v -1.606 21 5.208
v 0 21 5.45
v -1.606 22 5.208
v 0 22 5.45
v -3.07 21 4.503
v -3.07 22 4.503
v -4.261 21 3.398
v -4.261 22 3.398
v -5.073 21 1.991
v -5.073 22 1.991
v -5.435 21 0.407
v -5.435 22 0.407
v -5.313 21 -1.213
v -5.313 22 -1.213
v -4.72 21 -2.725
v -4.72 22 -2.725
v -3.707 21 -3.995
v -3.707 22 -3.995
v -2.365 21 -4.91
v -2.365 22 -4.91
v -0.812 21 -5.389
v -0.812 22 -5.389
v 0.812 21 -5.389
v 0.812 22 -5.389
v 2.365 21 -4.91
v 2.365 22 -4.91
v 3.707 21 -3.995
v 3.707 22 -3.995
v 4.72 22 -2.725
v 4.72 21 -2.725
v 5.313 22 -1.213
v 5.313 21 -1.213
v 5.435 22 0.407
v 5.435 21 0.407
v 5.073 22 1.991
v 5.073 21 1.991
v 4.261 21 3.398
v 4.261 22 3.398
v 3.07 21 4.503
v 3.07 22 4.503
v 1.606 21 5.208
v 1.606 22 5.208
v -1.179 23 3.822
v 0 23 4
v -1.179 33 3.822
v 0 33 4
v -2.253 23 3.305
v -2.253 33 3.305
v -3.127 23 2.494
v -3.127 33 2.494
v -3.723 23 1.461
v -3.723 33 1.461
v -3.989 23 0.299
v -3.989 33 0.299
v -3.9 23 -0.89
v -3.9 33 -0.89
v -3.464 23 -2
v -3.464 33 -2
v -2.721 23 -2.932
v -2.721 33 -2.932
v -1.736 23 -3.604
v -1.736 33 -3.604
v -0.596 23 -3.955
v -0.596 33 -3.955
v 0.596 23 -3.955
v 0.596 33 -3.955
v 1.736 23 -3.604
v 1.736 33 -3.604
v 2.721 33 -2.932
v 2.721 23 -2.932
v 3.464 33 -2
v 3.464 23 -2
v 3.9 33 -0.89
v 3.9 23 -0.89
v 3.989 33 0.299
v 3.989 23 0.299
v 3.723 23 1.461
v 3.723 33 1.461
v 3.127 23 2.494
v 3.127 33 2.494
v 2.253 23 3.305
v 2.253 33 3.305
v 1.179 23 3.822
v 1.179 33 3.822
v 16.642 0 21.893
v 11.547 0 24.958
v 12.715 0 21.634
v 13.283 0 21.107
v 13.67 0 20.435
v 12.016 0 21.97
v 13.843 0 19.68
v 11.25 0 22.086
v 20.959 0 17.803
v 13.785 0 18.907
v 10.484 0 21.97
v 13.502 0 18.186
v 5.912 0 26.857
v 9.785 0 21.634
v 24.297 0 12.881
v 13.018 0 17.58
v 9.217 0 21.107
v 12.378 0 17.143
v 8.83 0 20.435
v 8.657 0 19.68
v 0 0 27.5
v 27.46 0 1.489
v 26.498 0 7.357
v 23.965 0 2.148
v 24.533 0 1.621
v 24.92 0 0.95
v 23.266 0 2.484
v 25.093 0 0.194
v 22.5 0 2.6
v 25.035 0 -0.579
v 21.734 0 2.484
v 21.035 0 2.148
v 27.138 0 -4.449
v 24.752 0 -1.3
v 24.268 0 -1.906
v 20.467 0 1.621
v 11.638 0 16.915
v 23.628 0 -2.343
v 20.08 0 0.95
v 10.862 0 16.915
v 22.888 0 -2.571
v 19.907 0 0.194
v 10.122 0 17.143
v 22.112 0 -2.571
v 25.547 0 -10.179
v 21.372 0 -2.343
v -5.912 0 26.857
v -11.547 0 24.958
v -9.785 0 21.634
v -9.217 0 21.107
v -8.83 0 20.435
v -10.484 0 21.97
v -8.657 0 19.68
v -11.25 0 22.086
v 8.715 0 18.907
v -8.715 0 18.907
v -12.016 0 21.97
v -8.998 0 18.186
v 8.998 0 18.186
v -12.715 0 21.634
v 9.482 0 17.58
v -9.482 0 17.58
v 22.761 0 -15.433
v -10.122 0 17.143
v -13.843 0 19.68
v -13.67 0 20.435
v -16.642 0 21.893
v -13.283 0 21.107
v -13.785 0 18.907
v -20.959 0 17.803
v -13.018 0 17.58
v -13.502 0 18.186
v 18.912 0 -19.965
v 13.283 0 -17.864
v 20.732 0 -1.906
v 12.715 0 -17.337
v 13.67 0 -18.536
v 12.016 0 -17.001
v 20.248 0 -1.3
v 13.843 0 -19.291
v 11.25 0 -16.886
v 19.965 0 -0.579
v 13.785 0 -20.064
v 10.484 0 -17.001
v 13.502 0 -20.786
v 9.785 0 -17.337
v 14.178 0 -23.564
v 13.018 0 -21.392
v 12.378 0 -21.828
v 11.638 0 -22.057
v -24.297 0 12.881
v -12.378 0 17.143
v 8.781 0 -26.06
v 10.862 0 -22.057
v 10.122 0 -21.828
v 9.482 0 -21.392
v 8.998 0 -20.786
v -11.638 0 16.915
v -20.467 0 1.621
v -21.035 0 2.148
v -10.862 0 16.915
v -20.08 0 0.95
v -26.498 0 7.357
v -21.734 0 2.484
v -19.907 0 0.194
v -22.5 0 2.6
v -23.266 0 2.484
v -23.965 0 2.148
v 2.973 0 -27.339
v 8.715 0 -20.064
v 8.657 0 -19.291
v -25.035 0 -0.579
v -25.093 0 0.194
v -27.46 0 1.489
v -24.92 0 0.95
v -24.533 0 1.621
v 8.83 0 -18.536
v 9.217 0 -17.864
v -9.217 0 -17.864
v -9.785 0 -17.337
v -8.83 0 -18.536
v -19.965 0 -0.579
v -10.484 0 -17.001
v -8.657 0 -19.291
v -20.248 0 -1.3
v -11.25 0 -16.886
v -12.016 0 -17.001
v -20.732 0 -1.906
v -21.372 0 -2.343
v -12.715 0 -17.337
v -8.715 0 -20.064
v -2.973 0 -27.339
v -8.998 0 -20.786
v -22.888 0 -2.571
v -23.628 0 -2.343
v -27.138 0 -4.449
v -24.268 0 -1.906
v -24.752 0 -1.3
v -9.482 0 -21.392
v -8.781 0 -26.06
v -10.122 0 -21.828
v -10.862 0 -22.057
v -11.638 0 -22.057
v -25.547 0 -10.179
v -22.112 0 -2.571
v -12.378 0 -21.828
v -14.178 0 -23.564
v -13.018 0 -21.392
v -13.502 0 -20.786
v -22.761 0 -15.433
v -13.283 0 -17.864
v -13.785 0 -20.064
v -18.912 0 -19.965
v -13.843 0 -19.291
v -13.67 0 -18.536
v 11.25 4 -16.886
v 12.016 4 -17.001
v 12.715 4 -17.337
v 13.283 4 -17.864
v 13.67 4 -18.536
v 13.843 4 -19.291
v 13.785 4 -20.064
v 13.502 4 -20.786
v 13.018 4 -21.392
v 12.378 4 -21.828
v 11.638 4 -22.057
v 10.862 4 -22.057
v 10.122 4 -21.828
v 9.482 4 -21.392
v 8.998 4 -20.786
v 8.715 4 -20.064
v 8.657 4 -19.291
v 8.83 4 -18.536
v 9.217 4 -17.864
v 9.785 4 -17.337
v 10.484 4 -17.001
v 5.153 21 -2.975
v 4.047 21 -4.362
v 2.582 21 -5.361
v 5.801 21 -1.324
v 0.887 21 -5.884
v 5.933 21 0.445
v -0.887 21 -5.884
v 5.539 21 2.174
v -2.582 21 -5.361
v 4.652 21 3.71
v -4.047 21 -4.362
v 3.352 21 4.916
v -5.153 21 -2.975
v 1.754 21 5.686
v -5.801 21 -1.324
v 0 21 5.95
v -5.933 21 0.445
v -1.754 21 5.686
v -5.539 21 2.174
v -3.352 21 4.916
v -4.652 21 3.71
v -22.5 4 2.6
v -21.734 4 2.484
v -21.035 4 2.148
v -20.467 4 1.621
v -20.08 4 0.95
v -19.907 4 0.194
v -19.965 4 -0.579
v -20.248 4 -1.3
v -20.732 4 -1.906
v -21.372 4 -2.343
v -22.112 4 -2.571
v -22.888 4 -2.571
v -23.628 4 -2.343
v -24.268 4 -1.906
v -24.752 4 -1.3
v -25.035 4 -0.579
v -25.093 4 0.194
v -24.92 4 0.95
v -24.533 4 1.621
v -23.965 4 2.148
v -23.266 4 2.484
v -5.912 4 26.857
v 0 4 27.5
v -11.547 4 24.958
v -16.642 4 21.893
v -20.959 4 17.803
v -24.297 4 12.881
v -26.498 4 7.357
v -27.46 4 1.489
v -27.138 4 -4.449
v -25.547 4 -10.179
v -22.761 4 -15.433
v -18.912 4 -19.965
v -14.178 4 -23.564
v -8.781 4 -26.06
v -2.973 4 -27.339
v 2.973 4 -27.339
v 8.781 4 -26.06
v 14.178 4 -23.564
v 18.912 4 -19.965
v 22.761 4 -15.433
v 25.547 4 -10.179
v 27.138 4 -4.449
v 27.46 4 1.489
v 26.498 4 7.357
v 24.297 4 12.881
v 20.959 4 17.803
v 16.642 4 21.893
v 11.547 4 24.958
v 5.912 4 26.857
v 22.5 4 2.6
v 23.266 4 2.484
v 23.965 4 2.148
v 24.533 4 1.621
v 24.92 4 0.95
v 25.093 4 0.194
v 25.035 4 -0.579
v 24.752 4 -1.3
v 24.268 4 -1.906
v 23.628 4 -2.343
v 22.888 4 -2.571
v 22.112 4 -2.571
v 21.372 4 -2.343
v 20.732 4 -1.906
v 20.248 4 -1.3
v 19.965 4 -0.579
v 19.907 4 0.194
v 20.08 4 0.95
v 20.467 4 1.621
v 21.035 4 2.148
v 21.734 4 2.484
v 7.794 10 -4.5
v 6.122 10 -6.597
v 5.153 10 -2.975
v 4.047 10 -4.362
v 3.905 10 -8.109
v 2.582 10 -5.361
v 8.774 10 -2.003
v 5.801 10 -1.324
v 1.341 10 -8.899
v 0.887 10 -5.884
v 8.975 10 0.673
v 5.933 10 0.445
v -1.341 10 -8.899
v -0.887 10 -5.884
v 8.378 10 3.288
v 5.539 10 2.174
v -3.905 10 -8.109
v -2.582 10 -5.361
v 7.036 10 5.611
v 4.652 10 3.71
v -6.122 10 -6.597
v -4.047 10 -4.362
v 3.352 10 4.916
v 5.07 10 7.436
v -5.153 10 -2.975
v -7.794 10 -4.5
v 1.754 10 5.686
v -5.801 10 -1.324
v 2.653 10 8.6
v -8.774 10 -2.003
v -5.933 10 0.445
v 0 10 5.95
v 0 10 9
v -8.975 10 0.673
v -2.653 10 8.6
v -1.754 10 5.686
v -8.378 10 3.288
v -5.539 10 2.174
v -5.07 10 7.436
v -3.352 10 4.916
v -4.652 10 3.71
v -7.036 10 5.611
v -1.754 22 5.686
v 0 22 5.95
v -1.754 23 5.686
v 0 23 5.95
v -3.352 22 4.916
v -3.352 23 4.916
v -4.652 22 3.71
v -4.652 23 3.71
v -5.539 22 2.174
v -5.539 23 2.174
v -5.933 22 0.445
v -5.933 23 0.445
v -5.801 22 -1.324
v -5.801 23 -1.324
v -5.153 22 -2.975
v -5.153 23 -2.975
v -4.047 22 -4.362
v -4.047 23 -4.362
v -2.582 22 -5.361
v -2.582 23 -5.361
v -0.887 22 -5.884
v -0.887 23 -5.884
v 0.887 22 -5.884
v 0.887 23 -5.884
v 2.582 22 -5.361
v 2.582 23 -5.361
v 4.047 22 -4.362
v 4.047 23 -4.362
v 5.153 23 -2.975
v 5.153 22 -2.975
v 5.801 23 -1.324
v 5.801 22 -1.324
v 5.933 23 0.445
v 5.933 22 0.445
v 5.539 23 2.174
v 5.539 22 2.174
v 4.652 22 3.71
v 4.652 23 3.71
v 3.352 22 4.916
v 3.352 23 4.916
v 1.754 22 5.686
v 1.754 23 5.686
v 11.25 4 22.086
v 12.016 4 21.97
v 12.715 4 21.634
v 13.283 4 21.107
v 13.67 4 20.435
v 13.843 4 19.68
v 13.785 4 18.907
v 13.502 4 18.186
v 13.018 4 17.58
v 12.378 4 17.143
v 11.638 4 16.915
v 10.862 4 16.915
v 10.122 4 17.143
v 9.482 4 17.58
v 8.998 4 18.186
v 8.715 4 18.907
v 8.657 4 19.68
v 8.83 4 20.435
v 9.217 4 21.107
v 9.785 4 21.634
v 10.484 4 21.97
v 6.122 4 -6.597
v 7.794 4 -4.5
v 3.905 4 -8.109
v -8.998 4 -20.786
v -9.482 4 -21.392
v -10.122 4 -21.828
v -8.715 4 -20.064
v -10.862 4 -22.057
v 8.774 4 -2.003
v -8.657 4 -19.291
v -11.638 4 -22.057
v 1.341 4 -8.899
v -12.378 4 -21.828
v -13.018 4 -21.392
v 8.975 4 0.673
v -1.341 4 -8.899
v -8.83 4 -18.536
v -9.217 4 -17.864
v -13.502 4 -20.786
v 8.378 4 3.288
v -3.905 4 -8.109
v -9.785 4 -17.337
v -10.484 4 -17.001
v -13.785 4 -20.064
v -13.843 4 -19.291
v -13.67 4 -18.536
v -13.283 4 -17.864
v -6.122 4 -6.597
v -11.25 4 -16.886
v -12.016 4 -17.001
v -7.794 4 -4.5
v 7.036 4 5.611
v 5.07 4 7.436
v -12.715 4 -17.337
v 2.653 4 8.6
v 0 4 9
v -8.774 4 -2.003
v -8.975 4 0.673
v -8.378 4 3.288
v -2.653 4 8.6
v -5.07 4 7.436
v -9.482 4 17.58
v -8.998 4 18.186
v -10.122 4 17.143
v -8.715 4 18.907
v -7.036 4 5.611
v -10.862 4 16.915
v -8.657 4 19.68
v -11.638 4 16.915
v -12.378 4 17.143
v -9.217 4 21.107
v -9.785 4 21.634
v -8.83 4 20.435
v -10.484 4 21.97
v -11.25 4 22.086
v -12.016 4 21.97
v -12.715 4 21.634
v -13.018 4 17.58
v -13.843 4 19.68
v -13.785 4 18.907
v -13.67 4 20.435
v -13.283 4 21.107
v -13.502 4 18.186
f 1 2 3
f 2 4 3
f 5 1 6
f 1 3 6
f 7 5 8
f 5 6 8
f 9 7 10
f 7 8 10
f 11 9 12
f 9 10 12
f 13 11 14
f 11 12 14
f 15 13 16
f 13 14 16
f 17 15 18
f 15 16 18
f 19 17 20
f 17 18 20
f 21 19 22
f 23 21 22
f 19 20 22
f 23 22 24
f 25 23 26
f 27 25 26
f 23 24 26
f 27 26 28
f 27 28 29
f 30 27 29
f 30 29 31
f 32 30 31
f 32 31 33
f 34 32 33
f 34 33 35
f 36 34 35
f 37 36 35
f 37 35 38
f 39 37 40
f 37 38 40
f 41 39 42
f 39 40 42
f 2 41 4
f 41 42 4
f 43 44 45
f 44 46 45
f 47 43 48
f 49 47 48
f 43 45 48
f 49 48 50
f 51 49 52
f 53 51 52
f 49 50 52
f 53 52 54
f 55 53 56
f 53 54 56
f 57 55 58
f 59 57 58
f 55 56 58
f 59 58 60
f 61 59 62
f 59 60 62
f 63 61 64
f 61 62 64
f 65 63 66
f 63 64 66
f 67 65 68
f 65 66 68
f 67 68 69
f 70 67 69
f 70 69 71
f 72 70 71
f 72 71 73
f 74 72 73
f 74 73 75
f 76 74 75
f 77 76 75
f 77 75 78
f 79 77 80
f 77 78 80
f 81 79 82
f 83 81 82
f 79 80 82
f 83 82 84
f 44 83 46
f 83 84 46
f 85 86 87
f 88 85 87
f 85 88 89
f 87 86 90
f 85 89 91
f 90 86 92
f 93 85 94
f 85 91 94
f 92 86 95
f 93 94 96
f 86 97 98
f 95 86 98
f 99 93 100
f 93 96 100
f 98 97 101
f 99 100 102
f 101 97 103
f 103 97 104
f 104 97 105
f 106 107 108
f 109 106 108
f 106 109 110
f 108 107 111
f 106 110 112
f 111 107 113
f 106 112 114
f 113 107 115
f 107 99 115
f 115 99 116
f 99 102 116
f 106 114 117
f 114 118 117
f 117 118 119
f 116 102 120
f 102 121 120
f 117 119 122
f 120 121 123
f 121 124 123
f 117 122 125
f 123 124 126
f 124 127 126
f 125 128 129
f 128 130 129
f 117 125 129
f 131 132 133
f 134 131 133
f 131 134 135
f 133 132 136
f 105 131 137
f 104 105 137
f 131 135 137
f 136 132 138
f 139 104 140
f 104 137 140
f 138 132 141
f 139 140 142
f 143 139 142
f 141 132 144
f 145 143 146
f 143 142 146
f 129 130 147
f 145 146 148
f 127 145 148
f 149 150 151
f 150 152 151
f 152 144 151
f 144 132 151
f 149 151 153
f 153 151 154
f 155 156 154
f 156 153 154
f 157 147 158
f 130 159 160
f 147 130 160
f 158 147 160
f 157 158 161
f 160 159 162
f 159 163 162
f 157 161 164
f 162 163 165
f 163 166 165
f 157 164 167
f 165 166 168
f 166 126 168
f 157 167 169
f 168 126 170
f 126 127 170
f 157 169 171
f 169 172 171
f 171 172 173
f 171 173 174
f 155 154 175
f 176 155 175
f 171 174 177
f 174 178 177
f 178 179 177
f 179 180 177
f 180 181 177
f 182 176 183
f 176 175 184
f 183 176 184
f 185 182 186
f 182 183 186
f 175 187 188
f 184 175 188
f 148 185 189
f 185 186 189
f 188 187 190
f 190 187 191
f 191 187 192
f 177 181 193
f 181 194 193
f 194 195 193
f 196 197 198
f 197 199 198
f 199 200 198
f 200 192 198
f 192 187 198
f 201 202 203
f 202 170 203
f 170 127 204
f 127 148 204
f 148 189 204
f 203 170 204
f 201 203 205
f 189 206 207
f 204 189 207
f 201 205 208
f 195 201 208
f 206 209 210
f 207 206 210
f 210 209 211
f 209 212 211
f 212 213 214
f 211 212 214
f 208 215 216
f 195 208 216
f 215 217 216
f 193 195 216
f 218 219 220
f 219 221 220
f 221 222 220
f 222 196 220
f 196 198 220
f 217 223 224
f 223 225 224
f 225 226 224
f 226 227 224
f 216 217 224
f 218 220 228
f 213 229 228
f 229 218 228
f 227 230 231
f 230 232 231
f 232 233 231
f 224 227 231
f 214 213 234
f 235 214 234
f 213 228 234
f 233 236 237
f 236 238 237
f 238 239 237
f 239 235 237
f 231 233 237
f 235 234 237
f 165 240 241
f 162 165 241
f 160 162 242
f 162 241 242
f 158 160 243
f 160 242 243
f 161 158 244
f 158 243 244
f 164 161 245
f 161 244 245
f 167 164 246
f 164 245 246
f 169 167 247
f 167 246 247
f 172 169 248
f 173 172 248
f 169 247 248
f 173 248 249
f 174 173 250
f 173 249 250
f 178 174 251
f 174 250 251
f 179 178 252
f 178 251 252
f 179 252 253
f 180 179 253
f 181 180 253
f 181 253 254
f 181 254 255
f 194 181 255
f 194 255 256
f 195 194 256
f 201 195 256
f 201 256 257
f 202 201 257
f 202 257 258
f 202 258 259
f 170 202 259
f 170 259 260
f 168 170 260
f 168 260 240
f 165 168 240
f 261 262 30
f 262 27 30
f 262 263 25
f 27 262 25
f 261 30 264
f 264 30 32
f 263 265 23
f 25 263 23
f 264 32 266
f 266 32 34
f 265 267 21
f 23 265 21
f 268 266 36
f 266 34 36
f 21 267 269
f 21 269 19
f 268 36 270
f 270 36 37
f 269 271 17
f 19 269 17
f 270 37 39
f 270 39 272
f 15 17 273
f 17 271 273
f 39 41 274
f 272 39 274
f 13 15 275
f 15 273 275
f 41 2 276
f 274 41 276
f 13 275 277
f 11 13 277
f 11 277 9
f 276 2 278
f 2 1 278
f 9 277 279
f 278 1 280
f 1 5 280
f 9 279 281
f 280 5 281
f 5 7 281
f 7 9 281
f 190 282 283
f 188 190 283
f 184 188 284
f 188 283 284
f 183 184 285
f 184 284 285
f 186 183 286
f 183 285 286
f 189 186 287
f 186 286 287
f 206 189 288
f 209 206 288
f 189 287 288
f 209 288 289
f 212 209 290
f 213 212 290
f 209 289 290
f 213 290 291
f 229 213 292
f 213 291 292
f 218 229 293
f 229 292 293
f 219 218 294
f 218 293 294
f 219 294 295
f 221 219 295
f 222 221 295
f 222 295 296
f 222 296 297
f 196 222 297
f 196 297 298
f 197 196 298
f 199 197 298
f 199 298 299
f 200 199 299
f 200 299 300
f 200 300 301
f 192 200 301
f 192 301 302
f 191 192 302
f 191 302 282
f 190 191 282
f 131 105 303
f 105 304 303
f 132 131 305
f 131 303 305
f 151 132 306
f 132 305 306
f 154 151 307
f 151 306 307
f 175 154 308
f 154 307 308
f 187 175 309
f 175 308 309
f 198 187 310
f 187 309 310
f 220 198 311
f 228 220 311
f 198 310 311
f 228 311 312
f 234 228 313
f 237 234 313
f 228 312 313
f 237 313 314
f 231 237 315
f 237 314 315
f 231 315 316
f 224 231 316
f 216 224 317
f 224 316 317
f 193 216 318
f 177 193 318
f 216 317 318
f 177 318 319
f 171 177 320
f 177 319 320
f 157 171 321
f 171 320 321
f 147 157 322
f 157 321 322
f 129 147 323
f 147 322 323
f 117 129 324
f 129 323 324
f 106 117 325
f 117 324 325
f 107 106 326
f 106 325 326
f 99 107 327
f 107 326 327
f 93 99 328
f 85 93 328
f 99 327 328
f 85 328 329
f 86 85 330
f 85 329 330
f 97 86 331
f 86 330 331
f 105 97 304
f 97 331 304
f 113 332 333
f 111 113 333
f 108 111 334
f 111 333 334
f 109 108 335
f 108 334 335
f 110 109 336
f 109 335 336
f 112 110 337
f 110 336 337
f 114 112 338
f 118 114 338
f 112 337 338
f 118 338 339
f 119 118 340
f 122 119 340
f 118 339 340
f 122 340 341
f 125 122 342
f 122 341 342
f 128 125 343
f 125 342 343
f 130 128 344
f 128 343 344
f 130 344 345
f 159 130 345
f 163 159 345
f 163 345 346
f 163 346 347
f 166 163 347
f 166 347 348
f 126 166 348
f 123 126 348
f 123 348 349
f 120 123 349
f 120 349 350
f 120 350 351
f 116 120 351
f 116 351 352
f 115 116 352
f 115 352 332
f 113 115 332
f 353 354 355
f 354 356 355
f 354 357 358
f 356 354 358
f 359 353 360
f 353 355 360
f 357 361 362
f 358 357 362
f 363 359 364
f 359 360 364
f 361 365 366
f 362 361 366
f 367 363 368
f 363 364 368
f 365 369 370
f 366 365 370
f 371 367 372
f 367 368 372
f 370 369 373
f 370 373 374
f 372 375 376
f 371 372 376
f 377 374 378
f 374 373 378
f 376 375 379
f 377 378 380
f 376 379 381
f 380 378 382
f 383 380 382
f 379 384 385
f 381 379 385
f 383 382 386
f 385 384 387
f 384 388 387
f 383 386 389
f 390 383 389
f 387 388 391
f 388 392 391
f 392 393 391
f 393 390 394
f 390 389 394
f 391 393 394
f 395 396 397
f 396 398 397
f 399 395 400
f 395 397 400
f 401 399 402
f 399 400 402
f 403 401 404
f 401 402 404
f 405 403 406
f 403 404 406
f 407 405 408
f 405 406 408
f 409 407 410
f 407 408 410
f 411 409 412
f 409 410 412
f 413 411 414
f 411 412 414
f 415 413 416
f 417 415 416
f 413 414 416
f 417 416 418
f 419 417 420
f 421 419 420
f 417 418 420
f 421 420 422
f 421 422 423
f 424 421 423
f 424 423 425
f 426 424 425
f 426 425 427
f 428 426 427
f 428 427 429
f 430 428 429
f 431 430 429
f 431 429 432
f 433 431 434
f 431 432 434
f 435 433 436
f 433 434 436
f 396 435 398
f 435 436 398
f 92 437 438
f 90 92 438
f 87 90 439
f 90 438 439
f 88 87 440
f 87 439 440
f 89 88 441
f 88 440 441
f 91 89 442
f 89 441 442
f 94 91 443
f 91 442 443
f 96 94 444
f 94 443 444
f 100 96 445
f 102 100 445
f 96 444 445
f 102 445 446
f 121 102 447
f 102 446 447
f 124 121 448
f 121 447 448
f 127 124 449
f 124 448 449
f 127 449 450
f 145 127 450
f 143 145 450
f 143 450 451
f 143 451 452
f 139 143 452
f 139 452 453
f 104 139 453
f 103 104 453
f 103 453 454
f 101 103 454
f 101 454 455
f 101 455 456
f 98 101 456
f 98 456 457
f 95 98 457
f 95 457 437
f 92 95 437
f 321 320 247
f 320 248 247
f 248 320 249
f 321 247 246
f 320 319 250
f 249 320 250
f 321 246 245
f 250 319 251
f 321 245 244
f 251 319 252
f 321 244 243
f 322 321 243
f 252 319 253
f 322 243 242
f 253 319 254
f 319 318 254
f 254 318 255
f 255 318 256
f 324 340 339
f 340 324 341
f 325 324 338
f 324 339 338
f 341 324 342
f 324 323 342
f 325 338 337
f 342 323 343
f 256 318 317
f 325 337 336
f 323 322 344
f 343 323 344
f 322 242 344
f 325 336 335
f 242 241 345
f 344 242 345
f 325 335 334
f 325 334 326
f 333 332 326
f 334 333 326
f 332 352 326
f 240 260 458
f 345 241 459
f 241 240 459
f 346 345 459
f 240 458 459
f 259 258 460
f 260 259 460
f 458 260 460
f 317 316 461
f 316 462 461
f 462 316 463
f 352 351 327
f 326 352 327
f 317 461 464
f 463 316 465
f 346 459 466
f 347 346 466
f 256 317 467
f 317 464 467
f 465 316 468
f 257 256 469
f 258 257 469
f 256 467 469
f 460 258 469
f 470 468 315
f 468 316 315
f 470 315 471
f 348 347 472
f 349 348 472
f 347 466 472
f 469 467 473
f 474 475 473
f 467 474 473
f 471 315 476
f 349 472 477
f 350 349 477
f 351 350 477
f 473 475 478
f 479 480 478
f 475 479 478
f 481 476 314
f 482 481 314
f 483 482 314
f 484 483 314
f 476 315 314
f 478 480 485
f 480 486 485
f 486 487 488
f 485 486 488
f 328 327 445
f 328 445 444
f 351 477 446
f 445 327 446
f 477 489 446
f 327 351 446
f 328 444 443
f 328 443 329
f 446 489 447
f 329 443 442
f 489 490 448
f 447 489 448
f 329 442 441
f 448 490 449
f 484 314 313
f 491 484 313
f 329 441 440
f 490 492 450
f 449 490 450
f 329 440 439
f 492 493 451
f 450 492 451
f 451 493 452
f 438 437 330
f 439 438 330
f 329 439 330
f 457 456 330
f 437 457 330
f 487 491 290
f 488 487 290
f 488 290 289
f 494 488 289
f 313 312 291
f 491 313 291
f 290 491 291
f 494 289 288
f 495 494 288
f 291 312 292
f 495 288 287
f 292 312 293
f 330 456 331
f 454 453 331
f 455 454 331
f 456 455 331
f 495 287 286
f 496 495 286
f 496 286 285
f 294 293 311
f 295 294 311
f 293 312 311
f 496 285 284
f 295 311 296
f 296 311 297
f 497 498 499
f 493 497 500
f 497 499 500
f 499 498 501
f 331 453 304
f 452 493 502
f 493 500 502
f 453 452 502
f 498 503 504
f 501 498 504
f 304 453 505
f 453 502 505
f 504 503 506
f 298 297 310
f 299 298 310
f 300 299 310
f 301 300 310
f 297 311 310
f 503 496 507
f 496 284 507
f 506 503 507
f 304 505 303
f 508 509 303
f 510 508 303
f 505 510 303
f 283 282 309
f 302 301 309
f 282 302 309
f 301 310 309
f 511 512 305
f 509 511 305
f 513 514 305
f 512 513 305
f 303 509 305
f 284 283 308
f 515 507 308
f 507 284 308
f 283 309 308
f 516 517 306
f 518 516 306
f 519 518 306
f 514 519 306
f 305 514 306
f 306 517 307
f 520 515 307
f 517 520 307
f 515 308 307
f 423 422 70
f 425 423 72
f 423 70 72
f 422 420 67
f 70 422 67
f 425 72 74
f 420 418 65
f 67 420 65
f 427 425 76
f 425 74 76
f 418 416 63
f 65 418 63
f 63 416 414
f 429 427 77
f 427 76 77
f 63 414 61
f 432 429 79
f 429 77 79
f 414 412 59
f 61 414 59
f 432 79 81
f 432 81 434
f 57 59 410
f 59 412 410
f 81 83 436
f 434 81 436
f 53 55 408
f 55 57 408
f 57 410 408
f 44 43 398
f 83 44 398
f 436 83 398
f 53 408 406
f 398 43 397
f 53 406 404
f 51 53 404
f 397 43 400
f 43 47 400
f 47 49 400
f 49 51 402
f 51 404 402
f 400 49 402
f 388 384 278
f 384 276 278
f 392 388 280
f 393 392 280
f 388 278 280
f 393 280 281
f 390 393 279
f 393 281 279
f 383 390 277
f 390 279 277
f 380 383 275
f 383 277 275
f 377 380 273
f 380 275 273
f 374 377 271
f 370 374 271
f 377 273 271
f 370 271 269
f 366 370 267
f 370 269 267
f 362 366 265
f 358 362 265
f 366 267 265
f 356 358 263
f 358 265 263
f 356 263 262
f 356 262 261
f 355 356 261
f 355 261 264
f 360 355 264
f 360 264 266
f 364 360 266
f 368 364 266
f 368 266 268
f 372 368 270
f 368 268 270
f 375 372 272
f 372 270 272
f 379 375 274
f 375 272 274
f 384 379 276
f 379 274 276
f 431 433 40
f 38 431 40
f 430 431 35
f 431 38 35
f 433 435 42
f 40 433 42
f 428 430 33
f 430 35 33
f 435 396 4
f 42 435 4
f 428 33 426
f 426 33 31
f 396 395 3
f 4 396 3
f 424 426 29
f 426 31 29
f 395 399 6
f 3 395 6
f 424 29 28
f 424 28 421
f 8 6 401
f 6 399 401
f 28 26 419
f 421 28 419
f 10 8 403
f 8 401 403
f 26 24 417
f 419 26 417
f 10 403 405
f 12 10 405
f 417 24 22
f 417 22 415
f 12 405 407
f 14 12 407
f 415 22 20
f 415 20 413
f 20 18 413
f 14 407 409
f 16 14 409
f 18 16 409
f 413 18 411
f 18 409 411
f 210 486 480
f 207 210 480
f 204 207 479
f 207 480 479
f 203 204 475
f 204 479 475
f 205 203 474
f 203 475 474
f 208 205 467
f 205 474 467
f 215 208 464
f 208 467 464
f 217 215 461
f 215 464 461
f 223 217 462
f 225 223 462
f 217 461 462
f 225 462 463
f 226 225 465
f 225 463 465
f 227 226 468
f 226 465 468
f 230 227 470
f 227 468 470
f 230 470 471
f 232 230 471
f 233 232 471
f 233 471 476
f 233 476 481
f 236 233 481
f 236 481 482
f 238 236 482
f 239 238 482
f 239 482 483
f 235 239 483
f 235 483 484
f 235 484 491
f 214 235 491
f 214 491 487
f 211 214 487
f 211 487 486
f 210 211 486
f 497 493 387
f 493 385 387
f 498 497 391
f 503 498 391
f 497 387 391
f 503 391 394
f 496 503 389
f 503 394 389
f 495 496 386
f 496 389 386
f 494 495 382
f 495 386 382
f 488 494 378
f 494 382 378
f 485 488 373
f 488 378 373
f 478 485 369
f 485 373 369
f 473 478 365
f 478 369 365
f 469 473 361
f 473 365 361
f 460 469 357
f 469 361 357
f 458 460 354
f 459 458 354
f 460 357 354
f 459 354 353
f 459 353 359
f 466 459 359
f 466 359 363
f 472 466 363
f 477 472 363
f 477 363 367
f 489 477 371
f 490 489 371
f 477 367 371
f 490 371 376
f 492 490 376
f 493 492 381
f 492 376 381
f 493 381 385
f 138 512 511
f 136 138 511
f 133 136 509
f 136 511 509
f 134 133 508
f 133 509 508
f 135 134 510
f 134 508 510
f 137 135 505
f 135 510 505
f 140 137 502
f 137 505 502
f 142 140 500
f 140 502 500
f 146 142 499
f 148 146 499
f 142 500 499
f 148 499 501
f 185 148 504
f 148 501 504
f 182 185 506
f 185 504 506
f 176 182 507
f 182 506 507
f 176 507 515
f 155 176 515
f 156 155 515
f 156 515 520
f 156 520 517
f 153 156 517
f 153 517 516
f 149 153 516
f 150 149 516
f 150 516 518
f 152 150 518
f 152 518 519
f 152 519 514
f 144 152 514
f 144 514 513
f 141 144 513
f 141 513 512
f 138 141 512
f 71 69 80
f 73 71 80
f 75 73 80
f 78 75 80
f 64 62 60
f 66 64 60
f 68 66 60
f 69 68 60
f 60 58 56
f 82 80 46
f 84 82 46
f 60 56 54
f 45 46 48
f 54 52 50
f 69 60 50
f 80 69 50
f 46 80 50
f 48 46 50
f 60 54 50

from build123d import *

# Parameters (mm, degrees)
SKETCH_2_R          = 2.6
CUT_EXTRUDE_1_DEPTH = 49.512884886


with BuildPart() as part:
    # 草图1 → 旋转1 (revolve)
    with BuildSketch(Plane.XY, mode=Mode.PRIVATE) as revolve_1_sk:
        Polygon((0, 0), (27.5, 0), (27.5, 4), (9, 4), (9, 10), (5.95, 10), (5.95, 21), (5.45, 21), (5.45, 22), (5.95, 22), (5.95, 23), (4, 23), (4, 33), (0, 33), (0, 23.5), align=None)
    revolve(revolve_1_sk.sketch.rotate(Axis((0, 23.5, 0), (0, -1, 0)), 90), axis=Axis((0, 23.5, 0), (0, -1, 0)))

    # 草图2 → 切除-拉伸1 (cut, through all)
    with BuildSketch(Plane(origin=(0, 4, 0), x_dir=(1, 0, 0), z_dir=(0, 1, 0))):
        with Locations(Location((22.5, 0, 0), (0, 0, 270))):
            Circle(SKETCH_2_R)
        with Locations(Location((11.25, -19.485571585, 0), (0, 0, 270))):
            Circle(SKETCH_2_R)
        with Locations(Location((-11.25, -19.485571585, 0), (0, 0, 270))):
            Circle(SKETCH_2_R)
        with Locations(Location((-22.5, 0, 0), (0, 0, 270))):
            Circle(SKETCH_2_R)
        with Locations(Location((-11.25, 19.485571585, 0), (0, 0, 270))):
            Circle(SKETCH_2_R)
        with Locations(Location((11.25, 19.485571585, 0), (0, 0, 270))):
            Circle(SKETCH_2_R)
    extrude(amount=-CUT_EXTRUDE_1_DEPTH, mode=Mode.SUBTRACT)


solid = part.part
